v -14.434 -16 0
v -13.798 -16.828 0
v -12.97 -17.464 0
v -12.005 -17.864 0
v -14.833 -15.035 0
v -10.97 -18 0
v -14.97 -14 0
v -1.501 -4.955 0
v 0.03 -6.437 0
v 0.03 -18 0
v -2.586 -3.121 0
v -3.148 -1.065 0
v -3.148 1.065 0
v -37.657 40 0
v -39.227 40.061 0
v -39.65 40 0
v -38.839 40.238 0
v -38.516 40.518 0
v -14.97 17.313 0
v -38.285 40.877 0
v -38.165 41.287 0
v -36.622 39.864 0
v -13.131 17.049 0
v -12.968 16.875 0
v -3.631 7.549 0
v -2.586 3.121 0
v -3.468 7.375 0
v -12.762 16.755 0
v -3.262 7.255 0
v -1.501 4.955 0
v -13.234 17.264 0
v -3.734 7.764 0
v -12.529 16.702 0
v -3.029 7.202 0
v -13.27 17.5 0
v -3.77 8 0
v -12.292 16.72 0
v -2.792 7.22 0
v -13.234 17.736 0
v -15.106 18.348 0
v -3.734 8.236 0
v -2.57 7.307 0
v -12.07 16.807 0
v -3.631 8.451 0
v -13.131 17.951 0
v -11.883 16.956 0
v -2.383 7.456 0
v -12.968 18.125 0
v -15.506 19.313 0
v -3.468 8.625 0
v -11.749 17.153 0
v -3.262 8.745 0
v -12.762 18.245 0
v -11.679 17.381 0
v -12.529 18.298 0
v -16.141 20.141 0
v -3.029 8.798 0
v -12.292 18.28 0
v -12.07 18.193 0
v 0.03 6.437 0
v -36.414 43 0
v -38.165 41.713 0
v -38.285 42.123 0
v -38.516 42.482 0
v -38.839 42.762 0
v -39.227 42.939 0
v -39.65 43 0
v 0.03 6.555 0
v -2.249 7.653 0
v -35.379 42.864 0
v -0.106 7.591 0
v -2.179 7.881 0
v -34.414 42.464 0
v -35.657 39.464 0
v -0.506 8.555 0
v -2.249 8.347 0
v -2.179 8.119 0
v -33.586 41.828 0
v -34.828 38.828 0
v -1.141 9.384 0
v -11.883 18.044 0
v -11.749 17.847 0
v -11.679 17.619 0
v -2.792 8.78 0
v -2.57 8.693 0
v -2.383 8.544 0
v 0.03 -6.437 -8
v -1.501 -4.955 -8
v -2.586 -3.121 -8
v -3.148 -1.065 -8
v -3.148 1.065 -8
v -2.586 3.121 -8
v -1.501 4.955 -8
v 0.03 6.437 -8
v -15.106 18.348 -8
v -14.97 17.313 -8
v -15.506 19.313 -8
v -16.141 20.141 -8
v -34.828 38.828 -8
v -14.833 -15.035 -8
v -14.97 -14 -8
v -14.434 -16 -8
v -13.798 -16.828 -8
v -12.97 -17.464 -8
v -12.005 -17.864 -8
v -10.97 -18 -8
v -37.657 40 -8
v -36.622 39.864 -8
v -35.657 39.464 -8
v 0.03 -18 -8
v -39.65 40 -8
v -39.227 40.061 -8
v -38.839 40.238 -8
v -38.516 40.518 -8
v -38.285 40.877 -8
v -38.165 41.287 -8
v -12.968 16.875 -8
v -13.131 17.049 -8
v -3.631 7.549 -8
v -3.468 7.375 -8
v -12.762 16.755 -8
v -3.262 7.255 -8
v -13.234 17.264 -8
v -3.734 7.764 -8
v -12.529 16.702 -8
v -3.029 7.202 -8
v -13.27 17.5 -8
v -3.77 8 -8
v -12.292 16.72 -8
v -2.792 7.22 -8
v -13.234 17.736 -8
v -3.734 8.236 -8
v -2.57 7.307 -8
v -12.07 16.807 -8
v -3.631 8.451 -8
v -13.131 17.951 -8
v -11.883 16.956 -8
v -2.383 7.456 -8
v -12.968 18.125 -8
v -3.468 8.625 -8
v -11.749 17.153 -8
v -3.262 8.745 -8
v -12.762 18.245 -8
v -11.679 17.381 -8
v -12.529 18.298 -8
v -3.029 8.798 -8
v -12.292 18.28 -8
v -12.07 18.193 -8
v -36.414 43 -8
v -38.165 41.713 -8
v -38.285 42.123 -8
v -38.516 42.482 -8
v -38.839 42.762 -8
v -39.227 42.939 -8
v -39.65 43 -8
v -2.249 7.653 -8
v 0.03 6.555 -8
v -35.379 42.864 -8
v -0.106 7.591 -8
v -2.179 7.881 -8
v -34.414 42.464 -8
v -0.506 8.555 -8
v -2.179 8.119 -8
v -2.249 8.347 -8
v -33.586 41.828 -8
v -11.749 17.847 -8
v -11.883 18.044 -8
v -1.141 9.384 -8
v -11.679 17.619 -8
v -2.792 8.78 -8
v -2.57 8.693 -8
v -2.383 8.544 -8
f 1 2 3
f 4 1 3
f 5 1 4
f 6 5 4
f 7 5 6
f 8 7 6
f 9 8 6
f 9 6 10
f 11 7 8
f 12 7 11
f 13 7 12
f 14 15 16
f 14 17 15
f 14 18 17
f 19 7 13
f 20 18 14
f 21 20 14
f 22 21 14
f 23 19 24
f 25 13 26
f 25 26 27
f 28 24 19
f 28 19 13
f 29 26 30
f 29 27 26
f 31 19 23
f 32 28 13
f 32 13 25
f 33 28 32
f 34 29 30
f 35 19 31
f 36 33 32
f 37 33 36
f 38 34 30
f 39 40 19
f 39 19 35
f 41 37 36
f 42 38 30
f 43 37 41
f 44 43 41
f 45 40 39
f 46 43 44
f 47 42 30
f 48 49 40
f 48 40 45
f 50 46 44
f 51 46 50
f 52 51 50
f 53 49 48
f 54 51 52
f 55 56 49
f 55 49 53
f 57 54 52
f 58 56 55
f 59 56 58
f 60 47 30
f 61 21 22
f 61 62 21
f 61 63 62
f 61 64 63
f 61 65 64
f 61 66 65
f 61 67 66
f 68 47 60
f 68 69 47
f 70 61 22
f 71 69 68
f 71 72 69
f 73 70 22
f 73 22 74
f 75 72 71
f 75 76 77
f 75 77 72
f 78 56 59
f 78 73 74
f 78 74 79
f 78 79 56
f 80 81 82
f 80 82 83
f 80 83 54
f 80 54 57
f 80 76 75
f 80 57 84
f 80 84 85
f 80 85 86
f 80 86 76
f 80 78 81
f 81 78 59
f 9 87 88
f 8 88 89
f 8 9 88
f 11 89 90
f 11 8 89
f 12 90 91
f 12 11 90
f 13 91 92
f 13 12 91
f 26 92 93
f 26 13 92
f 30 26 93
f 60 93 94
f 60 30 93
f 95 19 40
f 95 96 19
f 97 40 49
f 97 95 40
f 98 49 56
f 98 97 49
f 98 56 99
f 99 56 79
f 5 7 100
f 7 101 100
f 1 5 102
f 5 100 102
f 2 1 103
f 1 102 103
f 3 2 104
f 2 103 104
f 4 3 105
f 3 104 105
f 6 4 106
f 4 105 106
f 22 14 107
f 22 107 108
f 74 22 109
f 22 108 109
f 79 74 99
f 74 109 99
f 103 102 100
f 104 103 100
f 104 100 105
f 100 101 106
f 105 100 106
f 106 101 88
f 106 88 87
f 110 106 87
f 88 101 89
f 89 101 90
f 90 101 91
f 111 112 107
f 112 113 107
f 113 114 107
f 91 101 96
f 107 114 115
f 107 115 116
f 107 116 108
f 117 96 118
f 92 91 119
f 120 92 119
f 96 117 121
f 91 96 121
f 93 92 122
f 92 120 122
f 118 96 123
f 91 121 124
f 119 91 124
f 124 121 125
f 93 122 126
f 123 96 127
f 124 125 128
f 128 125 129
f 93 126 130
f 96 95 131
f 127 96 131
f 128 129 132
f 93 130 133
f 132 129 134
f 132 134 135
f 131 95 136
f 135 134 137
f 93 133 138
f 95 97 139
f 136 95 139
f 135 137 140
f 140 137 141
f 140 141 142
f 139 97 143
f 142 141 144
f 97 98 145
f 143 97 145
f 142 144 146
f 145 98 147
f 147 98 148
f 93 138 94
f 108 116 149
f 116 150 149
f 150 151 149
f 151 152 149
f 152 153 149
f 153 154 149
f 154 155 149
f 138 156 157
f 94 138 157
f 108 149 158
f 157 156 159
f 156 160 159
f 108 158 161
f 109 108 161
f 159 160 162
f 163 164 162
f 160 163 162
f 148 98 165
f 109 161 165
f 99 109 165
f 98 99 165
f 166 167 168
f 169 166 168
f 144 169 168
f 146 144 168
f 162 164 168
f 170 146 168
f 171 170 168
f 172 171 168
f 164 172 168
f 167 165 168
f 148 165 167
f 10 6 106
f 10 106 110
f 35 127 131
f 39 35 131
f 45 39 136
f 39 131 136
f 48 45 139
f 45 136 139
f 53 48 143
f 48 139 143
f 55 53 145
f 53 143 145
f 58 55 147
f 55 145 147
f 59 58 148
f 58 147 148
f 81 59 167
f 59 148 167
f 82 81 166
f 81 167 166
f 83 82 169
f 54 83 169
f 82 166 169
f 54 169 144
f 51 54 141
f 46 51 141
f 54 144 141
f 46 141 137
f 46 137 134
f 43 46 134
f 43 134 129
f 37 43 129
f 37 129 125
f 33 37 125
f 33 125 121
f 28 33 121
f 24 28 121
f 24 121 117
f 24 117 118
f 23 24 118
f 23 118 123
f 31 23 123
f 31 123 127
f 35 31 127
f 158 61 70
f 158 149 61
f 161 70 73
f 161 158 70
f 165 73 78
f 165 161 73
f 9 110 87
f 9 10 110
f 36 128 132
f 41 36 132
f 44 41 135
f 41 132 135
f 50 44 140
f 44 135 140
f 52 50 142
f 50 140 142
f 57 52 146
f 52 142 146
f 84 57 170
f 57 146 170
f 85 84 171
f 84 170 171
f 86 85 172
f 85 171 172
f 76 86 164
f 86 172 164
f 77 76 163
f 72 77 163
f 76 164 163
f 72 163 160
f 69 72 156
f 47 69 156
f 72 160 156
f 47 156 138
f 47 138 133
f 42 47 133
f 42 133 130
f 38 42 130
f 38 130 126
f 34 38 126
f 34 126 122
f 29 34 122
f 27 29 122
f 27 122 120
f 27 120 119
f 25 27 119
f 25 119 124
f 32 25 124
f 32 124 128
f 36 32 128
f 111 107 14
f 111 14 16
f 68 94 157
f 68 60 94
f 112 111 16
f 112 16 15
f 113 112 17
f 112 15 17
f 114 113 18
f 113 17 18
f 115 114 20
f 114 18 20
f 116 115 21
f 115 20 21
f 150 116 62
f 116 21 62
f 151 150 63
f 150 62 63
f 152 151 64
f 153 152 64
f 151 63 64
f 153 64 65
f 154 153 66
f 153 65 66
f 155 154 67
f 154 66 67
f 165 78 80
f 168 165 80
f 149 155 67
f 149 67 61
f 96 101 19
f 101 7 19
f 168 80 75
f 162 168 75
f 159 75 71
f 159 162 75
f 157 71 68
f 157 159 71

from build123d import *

# Parameters (mm, degrees)
EXTRUDE_618_DEPTH   = 8
HOLE_WIZARD_M2_D    = 1.6
SKETCH_5_W          = 15
SKETCH_5_H          = 23
EXTRUDE_1905_DEPTH  = 8
FILLET_1_R          = 4
CUT_EXTRUDE_1_DEPTH = 60.03470161


with BuildPart() as part:
    # Эскиз1 → Extrude 618 (new body)
    with BuildSketch(Plane.XY):
        with BuildLine():
            Line((0.03033425, 5), (-14.96966575, 5))
            Line((-14.96966575, 5), (-14.96966575, 18.96966575))
            Line((-14.96966575, 18.96966575), (-36, 40))
            Line((-36, 40), (-39.64966575, 40))
            ThreePointArc((-39.64966575, 40), (-38.14966575, 41.5), (-39.64966575, 43))
            Line((-39.64966575, 43), (-34.757359313, 43))
            Line((-34.757359313, 43), (0.03033425, 8.212306438))
            Line((0.03033425, 8.212306438), (0.03033425, 5))
        make_face()
    extrude(amount=-EXTRUDE_618_DEPTH)

    # Крепление M2 (through all)
    with Locations(Plane.XY):
        with Locations((-2.96966575, 8), (-12.46966575, 17.5)):
            Hole(HOLE_WIZARD_M2_D / 2)

    # Эскиз5 → Extrude 1905 (add)
    with BuildSketch(Plane.XY):
        with Locations((-7.46966575, -6.5)):
            Rectangle(SKETCH_5_W, SKETCH_5_H)
    extrude(amount=-EXTRUDE_1905_DEPTH)

    # Скругление1
    fillet_1_edges = [part.edges().sort_by_distance(p)[0] for p in [
        (-14.96966575, 18.96966575, -4),
        (-36, 40, -4),
        (-34.757359313, 43, -4),
        (0.03033425, 8.212306438, -4),
        (-14.96966575, -18, -4),
    ]]
    fillet(fillet_1_edges, radius=FILLET_1_R)

    # Эскиз6 → Вырез-Вытянуть1 (cut, through all)
    with BuildSketch(Plane.XY):
        with BuildLine():
            Line((0.03033425, 6.437196595), (0.03033425, -6.437196595))
            ThreePointArc((0.03033425, -6.437196595), (-3.21966575, 0), (0.03033425, 6.437196595))
        make_face()
    extrude(amount=-CUT_EXTRUDE_1_DEPTH, mode=Mode.SUBTRACT)


solid = part.part
